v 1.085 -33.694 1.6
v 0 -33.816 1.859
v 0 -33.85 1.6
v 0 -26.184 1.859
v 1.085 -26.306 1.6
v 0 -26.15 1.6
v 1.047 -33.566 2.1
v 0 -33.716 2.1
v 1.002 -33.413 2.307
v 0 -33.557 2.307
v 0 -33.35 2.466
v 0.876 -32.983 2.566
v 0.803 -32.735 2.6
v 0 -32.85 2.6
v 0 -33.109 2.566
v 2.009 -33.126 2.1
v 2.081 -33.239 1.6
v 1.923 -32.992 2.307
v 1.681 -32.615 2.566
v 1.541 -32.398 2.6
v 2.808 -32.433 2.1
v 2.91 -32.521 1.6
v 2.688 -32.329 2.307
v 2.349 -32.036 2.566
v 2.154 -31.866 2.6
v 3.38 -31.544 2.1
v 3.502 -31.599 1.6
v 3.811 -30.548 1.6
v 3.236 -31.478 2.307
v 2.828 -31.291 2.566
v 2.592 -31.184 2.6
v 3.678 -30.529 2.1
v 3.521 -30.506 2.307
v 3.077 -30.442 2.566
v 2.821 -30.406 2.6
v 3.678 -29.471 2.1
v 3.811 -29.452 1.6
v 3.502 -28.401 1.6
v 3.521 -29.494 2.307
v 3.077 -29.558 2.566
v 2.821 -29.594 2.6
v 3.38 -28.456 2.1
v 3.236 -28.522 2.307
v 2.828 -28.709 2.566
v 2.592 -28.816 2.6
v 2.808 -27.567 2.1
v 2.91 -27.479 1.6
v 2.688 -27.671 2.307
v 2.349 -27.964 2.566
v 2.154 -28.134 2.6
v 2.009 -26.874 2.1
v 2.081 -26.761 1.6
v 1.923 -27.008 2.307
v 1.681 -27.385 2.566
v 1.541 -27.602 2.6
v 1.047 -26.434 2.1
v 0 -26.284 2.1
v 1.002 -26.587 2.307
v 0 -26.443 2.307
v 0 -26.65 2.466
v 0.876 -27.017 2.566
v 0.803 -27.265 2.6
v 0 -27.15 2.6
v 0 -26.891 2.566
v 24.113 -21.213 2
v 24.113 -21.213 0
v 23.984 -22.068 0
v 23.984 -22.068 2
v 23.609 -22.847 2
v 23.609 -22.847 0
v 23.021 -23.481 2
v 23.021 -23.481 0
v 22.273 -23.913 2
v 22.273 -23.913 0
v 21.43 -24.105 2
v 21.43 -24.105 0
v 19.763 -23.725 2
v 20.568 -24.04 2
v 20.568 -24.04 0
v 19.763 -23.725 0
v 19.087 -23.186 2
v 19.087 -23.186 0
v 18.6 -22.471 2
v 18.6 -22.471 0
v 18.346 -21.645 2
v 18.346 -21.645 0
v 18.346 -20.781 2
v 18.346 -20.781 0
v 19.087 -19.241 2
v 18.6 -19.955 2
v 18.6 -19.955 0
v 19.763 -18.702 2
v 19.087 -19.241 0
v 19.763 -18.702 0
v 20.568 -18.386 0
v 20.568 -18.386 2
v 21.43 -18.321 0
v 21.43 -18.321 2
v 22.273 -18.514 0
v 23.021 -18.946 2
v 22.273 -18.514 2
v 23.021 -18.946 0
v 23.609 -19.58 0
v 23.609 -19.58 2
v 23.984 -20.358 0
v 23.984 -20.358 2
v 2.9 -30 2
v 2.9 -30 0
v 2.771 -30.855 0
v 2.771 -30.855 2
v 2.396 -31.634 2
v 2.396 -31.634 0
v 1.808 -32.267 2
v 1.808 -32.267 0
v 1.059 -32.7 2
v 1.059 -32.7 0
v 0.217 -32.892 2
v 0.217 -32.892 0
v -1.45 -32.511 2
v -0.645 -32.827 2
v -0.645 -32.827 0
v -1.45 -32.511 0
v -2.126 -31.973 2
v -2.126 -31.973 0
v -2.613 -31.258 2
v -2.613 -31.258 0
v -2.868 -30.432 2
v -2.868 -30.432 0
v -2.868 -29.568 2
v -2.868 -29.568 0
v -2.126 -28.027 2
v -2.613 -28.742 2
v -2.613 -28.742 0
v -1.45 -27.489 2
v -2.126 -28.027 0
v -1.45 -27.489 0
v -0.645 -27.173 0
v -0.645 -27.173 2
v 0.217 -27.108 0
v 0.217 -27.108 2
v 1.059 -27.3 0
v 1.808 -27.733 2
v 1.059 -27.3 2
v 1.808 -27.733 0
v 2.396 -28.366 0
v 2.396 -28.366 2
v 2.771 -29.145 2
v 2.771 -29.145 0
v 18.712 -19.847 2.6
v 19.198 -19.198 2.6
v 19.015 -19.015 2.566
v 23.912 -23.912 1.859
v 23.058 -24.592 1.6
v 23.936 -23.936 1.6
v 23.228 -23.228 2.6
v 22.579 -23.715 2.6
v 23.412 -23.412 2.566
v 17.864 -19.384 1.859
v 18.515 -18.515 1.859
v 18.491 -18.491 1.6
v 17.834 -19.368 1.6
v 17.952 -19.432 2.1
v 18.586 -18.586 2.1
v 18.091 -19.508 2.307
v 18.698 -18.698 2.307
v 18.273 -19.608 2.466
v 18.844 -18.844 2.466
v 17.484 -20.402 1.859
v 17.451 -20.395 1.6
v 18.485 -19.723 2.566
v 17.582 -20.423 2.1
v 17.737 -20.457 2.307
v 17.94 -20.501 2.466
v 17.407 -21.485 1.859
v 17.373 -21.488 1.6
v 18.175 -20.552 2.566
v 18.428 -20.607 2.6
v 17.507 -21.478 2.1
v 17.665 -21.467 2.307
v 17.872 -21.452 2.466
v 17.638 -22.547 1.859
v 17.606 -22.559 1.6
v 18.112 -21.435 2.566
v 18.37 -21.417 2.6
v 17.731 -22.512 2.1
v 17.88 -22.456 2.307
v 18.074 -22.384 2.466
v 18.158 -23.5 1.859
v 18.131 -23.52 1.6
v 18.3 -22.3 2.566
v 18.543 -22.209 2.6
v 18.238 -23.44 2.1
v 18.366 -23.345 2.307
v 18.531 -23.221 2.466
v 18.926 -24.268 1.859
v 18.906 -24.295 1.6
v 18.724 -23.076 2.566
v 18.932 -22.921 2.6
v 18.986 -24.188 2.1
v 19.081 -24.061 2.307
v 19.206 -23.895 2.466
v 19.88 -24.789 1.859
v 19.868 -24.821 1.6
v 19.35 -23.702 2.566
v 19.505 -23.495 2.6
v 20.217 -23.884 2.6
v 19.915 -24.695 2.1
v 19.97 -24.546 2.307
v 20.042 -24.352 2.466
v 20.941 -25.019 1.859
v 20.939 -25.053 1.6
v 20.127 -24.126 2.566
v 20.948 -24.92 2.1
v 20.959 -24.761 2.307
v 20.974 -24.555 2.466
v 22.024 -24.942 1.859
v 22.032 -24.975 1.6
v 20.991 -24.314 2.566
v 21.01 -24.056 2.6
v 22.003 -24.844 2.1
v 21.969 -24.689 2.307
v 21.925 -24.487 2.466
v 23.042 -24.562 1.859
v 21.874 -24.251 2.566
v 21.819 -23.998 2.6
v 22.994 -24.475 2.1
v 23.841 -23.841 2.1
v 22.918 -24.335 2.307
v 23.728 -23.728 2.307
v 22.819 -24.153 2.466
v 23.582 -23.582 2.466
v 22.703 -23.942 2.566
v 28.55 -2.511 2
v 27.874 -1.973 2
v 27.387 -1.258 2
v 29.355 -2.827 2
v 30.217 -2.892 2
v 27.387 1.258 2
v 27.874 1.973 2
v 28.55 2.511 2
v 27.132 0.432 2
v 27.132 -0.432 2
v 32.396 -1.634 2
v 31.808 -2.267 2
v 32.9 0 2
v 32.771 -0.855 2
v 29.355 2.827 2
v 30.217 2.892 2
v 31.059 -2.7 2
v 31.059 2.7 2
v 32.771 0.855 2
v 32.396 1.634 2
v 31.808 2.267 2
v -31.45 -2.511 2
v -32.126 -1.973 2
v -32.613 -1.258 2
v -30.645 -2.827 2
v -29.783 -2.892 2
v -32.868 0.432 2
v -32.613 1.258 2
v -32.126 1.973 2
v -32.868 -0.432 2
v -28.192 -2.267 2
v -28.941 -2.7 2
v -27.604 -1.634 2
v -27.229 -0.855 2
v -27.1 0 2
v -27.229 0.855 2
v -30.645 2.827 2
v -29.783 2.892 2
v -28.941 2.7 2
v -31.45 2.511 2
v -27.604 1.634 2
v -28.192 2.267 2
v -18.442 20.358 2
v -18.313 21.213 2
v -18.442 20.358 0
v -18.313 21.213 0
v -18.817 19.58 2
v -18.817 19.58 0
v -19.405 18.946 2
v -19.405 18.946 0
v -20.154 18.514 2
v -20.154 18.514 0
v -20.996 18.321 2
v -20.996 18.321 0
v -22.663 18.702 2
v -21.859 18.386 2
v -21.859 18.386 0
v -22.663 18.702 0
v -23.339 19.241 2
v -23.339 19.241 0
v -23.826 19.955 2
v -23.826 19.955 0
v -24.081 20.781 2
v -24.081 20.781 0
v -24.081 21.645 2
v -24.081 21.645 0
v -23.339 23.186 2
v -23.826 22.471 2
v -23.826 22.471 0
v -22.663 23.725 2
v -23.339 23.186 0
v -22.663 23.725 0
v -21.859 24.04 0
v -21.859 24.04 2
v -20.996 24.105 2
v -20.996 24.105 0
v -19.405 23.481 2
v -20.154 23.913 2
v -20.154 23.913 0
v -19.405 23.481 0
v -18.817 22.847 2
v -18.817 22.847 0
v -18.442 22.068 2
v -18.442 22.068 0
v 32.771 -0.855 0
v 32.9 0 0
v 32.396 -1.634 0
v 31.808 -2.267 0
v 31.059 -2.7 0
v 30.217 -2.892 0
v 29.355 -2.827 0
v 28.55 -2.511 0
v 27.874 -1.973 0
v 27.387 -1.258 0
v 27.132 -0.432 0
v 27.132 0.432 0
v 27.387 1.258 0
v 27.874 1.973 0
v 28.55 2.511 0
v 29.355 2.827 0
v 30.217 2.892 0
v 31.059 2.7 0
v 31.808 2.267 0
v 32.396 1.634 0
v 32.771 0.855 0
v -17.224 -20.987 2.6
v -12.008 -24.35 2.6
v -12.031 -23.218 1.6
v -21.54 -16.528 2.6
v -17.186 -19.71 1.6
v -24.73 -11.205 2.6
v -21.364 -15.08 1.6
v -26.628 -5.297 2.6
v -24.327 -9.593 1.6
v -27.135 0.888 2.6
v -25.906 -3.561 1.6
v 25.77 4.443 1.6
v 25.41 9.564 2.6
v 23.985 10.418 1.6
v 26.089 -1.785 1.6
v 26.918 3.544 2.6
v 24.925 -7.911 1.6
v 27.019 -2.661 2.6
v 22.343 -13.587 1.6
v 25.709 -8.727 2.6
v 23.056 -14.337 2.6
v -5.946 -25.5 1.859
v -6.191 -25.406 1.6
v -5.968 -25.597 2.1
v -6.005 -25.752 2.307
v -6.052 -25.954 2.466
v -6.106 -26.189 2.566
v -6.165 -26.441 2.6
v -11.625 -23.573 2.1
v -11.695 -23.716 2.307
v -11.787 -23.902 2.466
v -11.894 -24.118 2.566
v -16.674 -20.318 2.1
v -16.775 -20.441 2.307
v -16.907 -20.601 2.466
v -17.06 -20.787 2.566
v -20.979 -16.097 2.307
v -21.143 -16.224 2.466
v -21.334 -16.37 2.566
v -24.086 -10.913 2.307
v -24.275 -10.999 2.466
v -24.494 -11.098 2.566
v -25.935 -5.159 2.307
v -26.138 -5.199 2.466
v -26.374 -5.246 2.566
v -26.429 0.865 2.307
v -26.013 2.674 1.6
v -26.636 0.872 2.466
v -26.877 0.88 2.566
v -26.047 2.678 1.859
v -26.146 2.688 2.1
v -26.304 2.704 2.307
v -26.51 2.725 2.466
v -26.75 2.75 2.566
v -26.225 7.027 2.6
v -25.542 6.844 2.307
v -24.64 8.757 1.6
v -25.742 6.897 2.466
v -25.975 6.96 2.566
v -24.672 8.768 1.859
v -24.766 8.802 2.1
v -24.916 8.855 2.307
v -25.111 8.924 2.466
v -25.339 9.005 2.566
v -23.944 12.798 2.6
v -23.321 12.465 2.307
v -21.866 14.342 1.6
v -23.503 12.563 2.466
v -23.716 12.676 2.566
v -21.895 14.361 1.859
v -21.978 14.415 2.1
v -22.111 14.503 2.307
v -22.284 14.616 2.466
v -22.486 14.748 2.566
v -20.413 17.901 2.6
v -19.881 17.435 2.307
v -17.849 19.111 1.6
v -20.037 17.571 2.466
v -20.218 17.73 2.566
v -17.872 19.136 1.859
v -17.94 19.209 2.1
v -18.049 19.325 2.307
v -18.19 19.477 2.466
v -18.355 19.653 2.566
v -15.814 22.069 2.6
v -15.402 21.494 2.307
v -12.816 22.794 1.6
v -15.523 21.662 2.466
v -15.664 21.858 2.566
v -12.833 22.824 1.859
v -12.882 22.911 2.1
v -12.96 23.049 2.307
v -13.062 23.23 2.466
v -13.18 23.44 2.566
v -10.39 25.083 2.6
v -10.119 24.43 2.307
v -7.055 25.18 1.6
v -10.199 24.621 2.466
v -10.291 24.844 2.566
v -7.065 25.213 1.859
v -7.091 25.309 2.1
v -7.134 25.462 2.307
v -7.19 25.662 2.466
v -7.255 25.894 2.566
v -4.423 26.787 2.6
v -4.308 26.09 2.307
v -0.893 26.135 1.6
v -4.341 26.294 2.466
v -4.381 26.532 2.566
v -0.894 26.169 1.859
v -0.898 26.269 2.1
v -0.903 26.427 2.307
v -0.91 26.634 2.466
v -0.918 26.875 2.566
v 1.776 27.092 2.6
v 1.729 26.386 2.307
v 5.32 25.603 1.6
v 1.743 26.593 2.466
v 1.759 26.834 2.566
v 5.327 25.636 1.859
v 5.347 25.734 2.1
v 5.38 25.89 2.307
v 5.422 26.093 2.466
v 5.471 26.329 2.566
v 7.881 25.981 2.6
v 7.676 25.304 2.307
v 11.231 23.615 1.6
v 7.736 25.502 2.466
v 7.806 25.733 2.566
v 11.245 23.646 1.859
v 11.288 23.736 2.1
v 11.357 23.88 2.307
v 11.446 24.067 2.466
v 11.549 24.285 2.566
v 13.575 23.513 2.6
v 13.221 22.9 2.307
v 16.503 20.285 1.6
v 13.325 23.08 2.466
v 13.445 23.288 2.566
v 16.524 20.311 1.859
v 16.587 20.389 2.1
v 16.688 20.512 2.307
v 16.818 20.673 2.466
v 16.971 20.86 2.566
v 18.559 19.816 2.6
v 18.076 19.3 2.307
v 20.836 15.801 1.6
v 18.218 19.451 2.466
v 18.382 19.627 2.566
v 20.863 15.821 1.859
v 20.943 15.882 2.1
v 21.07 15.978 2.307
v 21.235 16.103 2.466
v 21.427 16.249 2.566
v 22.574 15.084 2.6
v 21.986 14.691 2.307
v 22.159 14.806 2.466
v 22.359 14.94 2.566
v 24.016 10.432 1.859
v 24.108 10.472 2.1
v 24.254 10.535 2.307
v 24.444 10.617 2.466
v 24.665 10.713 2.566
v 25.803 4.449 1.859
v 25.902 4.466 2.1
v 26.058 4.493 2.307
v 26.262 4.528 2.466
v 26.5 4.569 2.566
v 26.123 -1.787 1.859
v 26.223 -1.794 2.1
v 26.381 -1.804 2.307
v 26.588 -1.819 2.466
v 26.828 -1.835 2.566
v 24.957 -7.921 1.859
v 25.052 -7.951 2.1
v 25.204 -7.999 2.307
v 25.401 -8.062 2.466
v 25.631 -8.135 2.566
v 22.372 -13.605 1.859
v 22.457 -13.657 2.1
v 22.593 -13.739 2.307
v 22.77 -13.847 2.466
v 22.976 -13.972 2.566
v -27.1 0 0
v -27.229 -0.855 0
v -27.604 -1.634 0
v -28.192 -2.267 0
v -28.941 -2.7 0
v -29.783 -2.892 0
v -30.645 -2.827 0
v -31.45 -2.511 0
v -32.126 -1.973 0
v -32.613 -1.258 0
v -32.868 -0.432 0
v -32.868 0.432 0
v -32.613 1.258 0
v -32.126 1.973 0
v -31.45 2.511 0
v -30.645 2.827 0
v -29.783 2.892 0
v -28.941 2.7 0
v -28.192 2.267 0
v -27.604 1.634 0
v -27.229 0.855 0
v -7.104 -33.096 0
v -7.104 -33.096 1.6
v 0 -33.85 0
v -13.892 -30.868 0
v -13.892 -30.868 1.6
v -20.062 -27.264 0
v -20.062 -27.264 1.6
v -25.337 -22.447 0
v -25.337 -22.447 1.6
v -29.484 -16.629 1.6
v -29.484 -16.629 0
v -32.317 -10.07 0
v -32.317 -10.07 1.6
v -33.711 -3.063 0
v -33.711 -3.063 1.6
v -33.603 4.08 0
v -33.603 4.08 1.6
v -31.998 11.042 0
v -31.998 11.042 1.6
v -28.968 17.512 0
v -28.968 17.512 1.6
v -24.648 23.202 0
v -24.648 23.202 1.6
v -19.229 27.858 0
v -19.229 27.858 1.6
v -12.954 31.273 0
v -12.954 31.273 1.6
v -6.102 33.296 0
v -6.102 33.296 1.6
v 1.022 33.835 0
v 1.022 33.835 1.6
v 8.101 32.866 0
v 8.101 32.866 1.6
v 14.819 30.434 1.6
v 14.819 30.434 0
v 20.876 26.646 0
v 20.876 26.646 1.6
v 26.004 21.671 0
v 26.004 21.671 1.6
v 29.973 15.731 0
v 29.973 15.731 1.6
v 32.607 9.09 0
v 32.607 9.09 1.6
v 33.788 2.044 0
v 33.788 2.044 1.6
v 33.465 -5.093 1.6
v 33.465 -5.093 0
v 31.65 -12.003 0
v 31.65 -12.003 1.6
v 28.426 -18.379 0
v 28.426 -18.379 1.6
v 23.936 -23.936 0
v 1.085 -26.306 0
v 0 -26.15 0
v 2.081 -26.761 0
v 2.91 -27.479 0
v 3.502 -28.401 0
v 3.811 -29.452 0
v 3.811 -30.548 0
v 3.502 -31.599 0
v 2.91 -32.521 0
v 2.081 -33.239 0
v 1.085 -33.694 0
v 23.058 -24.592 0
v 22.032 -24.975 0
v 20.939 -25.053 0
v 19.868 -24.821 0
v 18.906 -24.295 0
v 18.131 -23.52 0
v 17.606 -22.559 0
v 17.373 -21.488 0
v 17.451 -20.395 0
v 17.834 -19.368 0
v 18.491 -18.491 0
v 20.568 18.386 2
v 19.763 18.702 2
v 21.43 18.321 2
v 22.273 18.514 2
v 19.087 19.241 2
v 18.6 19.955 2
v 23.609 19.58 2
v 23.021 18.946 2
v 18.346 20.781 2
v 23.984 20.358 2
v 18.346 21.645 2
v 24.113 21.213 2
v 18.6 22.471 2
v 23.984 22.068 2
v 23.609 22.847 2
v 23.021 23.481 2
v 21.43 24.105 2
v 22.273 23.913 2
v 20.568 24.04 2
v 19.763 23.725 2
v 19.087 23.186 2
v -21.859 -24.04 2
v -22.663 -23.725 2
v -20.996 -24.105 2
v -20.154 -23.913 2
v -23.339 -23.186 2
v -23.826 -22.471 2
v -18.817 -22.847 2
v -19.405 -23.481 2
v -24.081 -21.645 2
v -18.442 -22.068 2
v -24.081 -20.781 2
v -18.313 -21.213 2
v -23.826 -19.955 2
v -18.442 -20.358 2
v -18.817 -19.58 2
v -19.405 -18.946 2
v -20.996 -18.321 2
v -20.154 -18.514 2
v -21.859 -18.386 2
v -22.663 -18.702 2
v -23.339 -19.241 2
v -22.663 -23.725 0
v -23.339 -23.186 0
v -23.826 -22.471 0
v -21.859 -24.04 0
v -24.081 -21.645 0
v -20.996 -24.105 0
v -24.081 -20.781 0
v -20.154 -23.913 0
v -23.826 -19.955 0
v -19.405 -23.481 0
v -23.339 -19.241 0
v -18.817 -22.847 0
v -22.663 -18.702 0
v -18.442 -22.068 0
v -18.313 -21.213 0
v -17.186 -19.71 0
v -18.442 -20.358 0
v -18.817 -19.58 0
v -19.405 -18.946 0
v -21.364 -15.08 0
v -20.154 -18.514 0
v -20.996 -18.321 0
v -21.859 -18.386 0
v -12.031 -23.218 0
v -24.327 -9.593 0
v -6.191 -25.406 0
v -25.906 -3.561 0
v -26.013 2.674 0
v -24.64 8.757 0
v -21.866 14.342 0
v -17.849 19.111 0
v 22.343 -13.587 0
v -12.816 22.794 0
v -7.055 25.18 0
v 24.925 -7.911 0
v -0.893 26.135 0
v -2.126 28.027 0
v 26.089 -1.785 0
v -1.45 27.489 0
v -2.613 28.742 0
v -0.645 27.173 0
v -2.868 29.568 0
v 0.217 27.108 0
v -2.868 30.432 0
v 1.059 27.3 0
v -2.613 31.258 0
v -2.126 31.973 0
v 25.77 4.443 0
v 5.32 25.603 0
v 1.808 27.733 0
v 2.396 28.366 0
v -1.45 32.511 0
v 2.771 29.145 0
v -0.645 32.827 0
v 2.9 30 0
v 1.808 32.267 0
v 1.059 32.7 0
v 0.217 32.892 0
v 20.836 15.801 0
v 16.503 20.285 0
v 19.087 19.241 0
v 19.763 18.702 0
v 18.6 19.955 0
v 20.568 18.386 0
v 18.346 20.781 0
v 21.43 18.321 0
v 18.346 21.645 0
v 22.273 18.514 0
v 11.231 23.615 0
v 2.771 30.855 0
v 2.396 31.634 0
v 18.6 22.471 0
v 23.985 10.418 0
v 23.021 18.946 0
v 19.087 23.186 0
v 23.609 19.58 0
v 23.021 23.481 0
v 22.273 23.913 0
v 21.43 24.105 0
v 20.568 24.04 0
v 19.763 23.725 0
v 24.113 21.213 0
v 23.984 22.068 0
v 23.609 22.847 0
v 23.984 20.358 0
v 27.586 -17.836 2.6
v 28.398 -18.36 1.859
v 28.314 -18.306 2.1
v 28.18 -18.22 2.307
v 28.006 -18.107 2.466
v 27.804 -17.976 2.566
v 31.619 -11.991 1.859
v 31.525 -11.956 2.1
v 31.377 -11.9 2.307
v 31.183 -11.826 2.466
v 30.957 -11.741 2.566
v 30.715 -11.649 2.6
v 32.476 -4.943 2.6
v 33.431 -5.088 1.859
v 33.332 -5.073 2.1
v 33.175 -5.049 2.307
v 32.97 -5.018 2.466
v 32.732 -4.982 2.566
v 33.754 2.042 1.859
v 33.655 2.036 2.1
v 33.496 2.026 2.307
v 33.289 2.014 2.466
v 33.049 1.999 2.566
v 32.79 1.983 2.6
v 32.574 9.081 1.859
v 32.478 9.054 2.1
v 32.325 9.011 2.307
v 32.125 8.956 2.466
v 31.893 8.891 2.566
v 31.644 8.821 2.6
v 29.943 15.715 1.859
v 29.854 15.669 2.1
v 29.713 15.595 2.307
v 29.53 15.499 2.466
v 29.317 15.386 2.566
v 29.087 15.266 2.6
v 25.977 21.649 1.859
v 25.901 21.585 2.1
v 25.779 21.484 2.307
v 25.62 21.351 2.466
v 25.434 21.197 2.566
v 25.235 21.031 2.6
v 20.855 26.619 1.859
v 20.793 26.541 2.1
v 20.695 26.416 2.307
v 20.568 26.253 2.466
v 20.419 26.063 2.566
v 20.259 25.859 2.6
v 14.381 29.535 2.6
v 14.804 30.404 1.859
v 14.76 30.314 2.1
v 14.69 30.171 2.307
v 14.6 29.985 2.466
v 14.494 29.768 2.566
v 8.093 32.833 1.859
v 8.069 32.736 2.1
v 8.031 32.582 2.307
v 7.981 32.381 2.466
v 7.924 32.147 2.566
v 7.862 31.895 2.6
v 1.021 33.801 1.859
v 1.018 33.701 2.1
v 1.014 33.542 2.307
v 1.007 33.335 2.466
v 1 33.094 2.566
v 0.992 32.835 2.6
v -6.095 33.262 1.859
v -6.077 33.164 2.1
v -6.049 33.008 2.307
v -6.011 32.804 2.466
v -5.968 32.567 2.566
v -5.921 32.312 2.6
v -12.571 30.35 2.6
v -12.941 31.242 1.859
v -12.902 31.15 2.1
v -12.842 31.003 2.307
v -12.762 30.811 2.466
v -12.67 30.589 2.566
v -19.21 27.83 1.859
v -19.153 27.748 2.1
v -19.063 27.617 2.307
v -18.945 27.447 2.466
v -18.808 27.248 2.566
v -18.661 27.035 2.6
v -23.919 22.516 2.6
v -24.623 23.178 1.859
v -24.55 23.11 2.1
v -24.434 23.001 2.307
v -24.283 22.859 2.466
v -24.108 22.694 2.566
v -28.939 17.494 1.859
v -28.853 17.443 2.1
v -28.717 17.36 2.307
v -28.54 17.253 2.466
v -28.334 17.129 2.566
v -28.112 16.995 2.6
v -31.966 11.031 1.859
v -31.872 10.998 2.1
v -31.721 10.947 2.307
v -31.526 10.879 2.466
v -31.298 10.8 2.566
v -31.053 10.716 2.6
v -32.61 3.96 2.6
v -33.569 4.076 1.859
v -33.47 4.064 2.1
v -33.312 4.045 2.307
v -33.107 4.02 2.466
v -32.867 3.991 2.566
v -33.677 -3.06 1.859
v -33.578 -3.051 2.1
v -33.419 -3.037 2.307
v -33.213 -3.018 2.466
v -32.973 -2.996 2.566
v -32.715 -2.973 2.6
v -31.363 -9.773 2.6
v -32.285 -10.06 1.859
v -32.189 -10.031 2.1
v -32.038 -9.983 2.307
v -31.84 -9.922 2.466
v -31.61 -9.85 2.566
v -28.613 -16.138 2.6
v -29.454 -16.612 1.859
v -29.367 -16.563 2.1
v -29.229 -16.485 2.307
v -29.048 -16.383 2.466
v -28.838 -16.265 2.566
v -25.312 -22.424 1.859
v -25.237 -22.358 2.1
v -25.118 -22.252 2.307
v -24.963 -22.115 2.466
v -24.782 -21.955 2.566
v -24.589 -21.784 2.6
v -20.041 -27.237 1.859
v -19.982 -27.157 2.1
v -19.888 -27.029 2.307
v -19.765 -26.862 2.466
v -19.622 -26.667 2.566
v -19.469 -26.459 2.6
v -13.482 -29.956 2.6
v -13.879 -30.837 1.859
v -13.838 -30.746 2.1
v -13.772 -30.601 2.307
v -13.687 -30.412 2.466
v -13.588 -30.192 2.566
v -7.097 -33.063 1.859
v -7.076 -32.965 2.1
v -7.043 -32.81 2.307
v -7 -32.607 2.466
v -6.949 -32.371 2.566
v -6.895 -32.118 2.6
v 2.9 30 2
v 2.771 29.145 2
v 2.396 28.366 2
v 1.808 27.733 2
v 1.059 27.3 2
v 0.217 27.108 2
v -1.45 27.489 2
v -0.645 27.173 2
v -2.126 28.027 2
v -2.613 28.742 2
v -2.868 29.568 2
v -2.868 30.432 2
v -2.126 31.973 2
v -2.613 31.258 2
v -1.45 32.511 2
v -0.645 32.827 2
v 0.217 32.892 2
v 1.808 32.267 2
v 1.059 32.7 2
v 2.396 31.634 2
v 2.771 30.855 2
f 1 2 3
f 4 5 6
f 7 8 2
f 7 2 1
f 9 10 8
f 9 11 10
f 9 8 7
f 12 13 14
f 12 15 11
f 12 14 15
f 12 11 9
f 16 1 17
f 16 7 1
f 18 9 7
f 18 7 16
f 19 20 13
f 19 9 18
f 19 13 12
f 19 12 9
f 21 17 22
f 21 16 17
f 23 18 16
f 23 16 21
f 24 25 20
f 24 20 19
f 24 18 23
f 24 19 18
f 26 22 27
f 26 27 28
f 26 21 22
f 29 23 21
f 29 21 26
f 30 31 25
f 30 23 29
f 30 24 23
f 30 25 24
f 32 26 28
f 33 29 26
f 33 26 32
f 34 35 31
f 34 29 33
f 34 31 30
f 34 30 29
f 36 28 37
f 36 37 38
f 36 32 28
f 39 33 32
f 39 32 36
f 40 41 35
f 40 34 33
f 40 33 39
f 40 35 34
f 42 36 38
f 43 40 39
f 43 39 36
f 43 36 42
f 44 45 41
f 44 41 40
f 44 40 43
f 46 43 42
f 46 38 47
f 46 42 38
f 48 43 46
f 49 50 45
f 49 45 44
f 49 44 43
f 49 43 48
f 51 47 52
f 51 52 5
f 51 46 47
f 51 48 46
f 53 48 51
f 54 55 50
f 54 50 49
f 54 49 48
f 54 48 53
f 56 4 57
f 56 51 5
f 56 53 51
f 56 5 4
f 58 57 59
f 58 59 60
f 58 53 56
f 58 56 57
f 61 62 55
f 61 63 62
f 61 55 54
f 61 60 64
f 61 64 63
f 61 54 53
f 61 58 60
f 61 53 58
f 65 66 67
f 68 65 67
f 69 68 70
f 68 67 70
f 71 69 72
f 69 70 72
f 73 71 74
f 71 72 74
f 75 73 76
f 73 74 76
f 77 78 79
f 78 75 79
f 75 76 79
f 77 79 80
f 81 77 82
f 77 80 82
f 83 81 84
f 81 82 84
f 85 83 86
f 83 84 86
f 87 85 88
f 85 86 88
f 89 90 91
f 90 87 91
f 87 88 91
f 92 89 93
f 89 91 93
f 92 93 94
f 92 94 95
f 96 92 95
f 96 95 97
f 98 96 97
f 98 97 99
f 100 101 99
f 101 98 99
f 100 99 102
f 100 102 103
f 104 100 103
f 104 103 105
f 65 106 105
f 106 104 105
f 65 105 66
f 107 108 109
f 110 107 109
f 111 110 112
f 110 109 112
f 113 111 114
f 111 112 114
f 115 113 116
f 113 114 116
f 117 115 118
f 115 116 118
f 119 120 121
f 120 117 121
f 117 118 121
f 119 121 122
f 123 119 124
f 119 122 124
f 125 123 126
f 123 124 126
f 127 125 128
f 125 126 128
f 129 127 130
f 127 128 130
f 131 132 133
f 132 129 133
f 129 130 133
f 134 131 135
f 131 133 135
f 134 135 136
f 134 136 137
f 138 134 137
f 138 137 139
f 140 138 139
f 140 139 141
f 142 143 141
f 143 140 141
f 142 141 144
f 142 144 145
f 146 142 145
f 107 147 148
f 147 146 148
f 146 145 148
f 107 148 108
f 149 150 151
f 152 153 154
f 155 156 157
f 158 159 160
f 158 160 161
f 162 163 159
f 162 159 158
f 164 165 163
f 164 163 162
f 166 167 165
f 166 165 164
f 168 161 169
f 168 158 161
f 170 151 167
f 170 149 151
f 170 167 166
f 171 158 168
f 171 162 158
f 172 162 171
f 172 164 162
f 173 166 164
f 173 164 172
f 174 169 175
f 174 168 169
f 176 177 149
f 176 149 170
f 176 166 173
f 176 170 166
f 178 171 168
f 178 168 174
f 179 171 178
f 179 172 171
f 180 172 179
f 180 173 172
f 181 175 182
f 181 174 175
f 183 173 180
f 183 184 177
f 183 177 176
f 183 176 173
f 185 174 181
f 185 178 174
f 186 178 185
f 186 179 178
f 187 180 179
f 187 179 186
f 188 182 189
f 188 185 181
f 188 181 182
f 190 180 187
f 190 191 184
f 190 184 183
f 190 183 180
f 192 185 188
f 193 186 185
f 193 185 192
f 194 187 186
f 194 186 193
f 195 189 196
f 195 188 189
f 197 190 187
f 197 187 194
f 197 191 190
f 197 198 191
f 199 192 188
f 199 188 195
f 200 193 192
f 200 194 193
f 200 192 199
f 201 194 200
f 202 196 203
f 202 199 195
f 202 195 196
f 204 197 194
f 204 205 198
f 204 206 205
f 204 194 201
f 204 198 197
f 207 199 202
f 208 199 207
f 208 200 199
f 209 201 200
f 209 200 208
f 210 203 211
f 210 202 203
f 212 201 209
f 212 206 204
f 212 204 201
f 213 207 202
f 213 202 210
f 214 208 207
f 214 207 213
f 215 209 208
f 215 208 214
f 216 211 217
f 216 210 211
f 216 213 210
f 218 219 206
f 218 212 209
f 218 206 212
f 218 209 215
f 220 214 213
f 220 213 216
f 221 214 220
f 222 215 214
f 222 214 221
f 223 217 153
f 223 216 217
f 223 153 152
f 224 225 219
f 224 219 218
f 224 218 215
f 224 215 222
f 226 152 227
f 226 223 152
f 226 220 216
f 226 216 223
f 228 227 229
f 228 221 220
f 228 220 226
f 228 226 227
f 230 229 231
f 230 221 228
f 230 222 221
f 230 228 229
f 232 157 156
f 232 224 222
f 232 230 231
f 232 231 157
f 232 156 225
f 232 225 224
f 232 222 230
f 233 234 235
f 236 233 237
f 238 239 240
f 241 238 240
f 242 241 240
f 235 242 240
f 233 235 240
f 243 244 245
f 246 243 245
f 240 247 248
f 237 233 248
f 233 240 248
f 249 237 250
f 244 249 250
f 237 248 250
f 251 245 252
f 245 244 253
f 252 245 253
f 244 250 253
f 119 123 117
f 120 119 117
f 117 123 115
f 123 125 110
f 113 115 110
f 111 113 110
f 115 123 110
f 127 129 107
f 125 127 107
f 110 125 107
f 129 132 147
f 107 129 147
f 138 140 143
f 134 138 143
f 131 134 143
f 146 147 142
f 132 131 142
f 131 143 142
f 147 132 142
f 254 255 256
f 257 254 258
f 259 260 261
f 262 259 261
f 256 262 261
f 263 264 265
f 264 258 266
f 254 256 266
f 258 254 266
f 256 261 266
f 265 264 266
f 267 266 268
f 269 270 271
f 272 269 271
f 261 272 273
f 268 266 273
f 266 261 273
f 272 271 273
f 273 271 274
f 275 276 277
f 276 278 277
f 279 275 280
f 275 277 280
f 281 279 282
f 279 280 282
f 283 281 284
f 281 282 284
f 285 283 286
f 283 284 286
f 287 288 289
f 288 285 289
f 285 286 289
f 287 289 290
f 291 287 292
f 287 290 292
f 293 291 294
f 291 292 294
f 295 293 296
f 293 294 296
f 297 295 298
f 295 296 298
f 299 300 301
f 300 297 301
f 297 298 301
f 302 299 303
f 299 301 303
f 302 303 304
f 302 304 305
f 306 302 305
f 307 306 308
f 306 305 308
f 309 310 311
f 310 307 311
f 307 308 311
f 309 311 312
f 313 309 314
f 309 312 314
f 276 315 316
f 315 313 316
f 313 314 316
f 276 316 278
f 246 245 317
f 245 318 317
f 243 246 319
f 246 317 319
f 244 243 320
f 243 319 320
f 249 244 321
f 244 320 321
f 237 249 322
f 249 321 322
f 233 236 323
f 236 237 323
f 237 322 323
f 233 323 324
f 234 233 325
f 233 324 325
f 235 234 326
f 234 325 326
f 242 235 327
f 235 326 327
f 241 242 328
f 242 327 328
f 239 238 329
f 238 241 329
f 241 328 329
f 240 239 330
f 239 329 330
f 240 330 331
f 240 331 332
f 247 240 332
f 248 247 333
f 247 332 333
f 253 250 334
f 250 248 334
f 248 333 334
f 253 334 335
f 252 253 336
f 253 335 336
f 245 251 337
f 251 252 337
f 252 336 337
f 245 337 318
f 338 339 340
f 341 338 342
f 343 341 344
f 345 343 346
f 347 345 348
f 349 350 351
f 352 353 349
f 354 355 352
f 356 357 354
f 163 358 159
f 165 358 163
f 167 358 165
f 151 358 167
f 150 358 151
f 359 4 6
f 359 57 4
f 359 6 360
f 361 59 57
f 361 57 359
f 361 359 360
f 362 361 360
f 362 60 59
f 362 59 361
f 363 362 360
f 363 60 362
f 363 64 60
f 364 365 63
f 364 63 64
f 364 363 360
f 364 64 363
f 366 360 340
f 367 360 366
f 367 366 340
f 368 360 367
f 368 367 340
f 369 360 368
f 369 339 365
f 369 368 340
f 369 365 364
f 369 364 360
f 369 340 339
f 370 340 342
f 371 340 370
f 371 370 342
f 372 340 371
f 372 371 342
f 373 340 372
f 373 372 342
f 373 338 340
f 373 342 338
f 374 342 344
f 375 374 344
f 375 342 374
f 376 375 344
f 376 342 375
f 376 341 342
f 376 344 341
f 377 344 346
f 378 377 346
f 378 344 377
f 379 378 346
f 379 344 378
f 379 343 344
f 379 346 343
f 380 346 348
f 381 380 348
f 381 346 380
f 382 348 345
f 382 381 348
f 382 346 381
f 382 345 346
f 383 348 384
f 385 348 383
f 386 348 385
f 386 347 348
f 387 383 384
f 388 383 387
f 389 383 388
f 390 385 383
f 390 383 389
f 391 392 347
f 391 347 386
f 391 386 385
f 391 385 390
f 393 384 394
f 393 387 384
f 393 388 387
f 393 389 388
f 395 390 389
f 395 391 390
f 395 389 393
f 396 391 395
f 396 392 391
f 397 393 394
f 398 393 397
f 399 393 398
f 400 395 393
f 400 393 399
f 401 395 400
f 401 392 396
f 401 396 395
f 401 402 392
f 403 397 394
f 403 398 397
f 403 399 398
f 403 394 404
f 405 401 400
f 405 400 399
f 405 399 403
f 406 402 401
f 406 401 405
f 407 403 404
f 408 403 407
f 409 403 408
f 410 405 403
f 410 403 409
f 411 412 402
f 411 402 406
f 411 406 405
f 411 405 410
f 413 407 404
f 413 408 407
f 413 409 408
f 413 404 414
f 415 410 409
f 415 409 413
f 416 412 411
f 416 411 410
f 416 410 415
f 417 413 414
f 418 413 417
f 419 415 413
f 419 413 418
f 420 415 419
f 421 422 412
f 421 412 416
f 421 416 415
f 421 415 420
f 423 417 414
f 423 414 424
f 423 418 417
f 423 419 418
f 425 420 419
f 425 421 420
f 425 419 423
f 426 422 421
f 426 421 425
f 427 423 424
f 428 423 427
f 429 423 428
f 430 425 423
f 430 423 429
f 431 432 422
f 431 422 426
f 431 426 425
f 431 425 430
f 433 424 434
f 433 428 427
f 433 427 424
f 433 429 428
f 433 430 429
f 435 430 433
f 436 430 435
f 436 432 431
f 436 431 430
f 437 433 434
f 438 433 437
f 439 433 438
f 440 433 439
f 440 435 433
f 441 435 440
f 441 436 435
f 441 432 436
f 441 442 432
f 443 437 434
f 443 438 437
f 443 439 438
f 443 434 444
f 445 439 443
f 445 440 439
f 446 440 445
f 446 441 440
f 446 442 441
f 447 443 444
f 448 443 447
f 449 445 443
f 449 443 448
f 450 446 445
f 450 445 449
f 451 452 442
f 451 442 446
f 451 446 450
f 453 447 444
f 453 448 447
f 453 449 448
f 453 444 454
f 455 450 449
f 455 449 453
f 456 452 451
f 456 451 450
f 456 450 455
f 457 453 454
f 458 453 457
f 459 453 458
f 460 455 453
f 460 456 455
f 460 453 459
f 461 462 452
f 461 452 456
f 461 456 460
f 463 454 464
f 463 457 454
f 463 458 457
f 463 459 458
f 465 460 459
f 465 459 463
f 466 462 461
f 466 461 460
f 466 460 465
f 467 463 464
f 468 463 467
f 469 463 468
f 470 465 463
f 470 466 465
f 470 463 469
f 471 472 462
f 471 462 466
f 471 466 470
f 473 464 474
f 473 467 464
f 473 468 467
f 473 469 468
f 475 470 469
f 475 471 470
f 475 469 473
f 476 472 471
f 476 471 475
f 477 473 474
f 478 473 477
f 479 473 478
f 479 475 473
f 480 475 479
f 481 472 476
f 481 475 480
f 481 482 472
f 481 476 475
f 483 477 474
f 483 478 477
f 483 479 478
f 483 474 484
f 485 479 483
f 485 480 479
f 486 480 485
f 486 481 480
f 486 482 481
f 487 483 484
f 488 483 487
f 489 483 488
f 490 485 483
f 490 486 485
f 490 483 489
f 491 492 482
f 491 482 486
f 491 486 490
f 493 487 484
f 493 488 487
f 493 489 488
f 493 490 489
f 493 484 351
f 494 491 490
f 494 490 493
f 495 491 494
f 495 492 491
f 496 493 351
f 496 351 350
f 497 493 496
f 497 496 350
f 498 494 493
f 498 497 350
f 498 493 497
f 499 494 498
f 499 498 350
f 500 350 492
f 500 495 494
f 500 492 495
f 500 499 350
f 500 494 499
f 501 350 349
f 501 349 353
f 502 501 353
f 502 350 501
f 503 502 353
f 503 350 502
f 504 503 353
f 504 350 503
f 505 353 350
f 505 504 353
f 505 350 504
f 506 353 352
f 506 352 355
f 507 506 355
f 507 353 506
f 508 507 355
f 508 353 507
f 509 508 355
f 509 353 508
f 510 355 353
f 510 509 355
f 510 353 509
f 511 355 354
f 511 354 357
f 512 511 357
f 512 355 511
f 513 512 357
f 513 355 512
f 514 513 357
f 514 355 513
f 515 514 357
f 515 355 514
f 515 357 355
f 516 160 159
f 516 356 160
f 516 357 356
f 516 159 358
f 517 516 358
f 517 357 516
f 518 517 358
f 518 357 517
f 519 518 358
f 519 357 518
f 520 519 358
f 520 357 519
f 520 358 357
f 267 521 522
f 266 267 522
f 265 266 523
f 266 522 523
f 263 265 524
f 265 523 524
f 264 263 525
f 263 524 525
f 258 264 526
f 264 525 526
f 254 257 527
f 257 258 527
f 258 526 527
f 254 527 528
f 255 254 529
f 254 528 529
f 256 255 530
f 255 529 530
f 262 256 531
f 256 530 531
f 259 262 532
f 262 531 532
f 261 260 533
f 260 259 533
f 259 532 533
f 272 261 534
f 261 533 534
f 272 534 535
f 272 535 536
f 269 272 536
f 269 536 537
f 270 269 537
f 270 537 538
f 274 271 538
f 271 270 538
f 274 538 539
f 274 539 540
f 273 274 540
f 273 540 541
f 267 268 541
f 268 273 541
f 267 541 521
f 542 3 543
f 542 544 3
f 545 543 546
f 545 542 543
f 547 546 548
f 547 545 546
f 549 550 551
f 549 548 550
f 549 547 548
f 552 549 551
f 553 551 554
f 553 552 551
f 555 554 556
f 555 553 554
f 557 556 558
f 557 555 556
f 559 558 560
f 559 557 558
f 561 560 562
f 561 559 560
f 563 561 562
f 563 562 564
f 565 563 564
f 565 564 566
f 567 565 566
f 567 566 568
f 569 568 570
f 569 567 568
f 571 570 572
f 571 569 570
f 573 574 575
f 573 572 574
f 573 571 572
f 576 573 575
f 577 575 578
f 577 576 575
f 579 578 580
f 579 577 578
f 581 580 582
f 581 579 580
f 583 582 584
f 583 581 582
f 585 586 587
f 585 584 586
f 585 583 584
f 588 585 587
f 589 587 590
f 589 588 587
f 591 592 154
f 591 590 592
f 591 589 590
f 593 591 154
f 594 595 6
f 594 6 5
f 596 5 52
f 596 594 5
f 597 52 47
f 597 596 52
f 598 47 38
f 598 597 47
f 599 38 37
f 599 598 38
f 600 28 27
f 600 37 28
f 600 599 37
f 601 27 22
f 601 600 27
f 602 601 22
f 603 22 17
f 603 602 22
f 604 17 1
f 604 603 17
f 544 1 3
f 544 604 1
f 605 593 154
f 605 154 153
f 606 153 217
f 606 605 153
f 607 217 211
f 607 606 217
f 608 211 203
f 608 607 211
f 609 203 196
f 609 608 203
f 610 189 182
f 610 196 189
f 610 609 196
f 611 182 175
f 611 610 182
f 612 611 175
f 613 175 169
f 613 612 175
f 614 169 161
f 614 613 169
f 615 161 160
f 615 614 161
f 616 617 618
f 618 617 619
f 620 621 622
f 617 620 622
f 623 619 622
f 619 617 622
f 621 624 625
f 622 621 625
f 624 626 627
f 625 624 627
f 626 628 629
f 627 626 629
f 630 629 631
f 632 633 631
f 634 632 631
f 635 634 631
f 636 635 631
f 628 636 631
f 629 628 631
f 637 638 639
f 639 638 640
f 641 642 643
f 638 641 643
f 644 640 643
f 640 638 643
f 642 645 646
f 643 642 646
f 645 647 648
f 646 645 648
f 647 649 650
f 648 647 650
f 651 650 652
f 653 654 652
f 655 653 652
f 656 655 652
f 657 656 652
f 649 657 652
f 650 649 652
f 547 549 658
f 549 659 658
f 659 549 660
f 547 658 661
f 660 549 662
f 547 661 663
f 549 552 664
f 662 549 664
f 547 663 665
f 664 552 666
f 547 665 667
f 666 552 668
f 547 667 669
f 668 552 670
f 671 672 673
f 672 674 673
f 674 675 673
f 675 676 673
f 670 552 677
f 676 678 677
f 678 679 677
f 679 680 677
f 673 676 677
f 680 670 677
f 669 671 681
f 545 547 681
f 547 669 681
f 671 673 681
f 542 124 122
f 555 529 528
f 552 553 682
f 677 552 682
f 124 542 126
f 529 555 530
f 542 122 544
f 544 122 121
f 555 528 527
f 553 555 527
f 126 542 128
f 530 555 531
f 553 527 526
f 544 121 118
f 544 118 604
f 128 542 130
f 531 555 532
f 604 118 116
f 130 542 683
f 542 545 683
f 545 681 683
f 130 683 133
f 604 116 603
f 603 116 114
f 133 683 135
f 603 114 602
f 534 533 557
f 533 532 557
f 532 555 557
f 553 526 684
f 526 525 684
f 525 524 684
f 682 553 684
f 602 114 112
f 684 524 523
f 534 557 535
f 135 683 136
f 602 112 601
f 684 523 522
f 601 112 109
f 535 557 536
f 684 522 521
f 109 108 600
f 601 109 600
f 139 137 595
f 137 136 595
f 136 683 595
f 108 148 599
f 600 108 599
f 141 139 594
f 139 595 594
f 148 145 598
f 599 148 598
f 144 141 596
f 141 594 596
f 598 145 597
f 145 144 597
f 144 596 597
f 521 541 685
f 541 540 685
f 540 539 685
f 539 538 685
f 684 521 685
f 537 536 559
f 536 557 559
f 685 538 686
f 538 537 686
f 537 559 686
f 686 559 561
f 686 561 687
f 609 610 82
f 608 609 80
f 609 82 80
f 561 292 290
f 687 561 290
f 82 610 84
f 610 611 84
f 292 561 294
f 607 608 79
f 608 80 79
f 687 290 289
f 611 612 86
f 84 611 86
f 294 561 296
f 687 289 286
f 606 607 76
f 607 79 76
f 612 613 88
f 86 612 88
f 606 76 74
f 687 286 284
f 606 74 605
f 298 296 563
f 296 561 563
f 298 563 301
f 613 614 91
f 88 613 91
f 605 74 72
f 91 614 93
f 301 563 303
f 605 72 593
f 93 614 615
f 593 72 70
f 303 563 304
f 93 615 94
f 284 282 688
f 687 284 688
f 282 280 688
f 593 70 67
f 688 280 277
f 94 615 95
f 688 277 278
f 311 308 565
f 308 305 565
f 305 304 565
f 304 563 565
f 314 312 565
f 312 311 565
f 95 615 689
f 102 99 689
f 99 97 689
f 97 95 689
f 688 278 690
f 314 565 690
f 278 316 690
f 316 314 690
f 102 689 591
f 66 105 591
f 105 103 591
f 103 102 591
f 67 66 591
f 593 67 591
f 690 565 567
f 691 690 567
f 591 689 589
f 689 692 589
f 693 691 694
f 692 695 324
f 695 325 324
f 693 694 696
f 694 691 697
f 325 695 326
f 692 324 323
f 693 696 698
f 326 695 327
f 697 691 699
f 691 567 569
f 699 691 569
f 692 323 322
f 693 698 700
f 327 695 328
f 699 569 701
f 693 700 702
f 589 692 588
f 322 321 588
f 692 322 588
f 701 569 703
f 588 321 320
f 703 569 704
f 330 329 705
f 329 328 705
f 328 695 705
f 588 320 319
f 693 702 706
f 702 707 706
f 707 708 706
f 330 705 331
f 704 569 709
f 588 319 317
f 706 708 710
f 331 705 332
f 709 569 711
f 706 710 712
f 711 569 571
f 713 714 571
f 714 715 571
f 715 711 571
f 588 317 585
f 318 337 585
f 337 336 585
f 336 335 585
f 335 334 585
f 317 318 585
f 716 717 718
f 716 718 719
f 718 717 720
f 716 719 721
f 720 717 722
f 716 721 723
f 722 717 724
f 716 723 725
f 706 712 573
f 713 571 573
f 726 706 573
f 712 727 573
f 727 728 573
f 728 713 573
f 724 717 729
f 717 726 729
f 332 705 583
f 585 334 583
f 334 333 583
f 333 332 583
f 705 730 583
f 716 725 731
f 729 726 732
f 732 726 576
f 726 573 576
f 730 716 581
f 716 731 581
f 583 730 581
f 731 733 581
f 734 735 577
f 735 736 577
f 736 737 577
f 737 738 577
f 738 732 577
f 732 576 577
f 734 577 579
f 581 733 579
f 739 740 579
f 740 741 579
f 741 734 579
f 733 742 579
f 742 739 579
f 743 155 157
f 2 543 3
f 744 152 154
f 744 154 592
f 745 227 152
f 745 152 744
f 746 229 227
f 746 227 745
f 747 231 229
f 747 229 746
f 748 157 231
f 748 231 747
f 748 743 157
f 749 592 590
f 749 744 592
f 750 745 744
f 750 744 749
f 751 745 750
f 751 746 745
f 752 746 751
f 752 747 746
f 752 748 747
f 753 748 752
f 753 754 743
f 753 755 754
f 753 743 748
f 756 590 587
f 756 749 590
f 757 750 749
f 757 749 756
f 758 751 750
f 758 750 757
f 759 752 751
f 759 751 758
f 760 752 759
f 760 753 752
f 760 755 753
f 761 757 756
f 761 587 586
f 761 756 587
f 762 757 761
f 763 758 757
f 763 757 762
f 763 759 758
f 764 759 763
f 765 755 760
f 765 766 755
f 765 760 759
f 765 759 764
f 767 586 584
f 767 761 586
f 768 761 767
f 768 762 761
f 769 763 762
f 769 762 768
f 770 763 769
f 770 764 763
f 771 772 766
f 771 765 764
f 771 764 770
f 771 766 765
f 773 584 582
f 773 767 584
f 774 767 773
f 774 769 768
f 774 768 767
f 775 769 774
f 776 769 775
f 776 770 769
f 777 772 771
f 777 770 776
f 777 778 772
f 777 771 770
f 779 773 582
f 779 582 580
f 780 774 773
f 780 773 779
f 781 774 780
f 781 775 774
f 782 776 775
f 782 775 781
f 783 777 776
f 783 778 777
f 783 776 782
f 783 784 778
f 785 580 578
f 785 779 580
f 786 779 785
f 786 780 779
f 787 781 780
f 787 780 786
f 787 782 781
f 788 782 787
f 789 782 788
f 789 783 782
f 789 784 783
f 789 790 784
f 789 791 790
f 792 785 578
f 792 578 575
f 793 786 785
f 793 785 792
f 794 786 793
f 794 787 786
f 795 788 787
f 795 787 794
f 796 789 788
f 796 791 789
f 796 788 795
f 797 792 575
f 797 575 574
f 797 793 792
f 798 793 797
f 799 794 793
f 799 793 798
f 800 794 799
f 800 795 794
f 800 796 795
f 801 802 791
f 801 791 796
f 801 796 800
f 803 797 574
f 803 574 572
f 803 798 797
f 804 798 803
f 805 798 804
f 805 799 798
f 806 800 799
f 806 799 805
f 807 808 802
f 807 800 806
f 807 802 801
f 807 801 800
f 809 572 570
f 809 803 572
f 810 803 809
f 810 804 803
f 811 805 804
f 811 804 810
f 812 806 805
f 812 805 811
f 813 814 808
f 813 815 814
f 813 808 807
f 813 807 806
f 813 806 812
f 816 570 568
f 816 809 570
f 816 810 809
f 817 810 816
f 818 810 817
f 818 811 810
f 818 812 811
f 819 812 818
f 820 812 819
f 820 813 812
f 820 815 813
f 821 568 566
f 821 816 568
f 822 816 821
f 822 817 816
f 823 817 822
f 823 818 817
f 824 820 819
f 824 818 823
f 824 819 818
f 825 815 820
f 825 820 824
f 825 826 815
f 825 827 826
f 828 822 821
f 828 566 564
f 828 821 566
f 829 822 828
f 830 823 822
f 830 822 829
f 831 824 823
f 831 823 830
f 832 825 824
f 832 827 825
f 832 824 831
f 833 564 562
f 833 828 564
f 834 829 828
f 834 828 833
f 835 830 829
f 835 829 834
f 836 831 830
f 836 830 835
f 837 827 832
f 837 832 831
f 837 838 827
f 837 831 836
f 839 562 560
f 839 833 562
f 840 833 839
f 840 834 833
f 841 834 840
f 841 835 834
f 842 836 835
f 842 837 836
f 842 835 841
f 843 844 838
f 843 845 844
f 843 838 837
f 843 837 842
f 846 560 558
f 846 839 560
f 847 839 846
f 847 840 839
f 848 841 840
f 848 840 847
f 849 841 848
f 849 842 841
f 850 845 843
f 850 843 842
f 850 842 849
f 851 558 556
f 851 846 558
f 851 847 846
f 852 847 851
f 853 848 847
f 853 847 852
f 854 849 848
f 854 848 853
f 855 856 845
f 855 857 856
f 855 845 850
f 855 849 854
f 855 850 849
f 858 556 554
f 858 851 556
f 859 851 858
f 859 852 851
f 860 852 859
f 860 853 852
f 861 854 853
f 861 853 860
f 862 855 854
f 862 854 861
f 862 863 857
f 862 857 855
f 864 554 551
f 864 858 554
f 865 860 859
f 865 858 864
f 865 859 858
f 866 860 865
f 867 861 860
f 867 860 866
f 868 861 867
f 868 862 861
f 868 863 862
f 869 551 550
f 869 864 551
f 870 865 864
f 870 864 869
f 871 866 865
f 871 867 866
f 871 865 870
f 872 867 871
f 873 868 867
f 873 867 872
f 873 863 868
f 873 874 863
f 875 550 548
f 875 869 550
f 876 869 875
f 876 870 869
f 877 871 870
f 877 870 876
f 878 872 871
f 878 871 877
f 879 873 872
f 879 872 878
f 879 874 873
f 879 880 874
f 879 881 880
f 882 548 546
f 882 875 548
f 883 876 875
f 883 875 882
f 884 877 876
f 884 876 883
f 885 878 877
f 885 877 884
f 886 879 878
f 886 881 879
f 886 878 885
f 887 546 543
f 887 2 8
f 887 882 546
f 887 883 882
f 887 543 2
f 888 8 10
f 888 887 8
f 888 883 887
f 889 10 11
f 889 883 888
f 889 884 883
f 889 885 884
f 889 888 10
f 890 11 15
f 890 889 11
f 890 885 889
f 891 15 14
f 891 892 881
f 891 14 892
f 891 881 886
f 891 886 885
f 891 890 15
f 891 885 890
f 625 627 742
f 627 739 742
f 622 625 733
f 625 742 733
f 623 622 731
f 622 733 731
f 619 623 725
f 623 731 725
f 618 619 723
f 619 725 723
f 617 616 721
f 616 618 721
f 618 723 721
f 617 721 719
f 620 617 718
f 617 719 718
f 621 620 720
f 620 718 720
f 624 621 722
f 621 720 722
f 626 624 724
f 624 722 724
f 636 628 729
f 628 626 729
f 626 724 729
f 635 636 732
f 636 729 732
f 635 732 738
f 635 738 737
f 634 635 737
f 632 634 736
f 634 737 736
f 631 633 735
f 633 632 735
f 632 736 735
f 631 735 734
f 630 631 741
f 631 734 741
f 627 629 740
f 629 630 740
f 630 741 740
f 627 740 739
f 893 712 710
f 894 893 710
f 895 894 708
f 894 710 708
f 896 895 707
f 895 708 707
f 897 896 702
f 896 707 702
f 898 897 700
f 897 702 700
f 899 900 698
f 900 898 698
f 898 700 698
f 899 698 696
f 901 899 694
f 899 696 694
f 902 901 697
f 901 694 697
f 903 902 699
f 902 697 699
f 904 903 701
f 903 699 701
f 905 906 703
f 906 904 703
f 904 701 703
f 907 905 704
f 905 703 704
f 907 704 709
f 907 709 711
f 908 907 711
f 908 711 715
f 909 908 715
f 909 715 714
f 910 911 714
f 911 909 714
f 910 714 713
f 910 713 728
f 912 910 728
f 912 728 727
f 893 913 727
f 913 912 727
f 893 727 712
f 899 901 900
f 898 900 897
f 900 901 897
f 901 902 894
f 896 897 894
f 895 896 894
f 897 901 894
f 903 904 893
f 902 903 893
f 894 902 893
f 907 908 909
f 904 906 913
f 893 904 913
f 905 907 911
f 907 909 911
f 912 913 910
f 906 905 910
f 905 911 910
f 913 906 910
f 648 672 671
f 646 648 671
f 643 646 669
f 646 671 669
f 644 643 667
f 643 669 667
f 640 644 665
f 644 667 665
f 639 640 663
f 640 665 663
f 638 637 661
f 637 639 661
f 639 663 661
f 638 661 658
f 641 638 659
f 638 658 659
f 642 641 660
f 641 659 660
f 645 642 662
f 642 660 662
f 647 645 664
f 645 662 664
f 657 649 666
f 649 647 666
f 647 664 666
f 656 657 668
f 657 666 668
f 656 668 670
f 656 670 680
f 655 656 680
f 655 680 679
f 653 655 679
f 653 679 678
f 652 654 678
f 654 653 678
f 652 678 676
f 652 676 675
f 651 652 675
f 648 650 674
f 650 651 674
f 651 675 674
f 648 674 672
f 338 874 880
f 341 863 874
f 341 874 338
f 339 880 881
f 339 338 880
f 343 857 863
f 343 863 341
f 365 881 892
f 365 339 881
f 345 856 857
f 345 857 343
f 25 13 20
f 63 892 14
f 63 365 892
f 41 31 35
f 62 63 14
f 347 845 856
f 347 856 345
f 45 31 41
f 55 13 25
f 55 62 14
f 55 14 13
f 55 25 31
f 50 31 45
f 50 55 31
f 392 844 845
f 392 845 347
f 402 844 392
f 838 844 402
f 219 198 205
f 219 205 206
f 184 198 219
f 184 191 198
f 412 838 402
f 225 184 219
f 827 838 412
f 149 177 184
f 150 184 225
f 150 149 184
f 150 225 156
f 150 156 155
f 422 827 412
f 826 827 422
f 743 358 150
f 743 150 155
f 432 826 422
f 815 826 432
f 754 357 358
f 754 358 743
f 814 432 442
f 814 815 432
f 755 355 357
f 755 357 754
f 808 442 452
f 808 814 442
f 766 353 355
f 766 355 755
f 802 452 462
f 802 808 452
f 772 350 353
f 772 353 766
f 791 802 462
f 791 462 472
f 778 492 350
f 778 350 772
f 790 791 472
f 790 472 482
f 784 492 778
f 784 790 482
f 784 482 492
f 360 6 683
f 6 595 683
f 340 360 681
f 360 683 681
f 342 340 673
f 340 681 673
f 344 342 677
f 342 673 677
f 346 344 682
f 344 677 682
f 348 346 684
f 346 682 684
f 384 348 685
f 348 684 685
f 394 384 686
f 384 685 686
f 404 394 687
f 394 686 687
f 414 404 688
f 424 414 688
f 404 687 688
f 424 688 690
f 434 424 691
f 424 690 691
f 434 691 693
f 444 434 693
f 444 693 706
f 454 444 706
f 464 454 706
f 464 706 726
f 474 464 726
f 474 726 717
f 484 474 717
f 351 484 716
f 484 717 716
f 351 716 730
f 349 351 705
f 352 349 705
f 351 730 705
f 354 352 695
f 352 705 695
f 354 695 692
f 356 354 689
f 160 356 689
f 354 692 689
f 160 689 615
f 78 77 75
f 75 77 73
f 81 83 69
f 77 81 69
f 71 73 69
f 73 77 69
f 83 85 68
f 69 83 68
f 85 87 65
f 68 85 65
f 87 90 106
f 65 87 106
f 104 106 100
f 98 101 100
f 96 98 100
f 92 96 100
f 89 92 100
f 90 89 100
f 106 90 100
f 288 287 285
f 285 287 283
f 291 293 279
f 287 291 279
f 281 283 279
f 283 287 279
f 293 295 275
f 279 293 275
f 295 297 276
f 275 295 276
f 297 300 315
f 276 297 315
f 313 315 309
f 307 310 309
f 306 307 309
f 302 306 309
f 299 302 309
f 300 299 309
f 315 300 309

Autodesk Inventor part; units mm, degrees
ref_plane "YZ Plane" through (0, 0, 0) normal (1, 0, 0) x (0, 1, 0)
ref_plane "XZ Plane" through (0, 0, 0) normal (0, 1, 0) x (-1, 0, 0)
ref_plane "XY Plane" through (0, 0, 0) normal (0, 0, 1) x (1, 0, 0)
sketch "Block1" plane through (0, 0, 0) normal (0, 0, 1) x (1, 0, 0)
  circle A0 centre (250, 0) radius 40 construction
  arc A1 (284, 0) -> (274.0416, -24.0416) centre (250, 0) ccw construction
  circle A2 centre (250, 0) radius 10.05 construction
  arc A3 (276, 0) -> (268.3848, -18.3848) centre (250, 0) ccw construction
  circle A4 centre (280, 0) radius 1.6 construction
  arc A5 (276, 0) -> (284, 0) centre (280, 0) ccw construction
  circle A6 centre (271.2132, -21.2132) radius 1.6 construction
  arc A7 (274.0416, -24.0416) -> (268.3848, -18.3848) centre (271.2132, -21.2132) ccw construction
  point P0 (269.205, -7.955)
  dimension "d0" = 8
sketch "Sketch1" plane through (0, 0, 0) normal (0, 0, 1) x (1, 0, 0)
  arc A0 (18.4908, -18.4908) -> (0, -26.15) centre (0, 0) ccw
  arc A1 (23.9356, -23.9356) -> (0, -33.85) centre (0, 0) ccw
  arc A2 (0, -33.85) -> (0, -26.15) centre (0, -30) ccw
  circle A3 centre (0, -30) radius 2.9
  arc A4 (18.4908, -18.4908) -> (23.9356, -23.9356) centre (21.2132, -21.2132) ccw
  circle A5 centre (21.2132, -21.2132) radius 2.9
  circle A6 centre (30, 0) radius 2.9
  circle A7 centre (21.2132, 21.2132) radius 2.9
  circle A8 centre (0, 30) radius 2.9
  circle A9 centre (-21.2132, 21.2132) radius 2.9
  circle A10 centre (-30, 0) radius 2.9
  circle A11 centre (-21.2132, -21.2132) radius 2.9
  point P0 (0, 0)
  point P1 (0, 0)
  dimension "d1" = 0.15
  dimension "d2" = 5.8
  dimension "d5" = 360
extrude "Extrusion1" add sketch "Sketch1" along normal blind 2
sketch "Sketch2" plane through (0, 0, 2) normal (0, 0, 1) x (1, 0, 0)
  arc A0 (23.9356, -23.9356) -> (0, -33.85) centre (0, 0) ccw projected
  arc A1 (0, -33.85) -> (0, -26.15) centre (0, -30) ccw projected
  arc A2 (18.4908, -18.4908) -> (0, -26.15) centre (0, 0) ccw projected
  arc A3 (18.4908, -18.4908) -> (23.9356, -23.9356) centre (21.2132, -21.2132) ccw projected
  circle A4 centre (0, 30) radius 2.9 projected
  circle A5 centre (30, 0) radius 2.9 projected
  circle A6 centre (21.2132, -21.2132) radius 2.9 projected
  circle A7 centre (-30, 0) radius 2.9 projected
  circle A8 centre (-21.2132, -21.2132) radius 2.9 projected
  circle A9 centre (-21.2132, 21.2132) radius 2.9 projected
  circle A10 centre (21.2132, 21.2132) radius 2.9 projected
  circle A11 centre (0, -30) radius 2.9 projected
  point P0 (0, 0)
extrude "Extrusion2" add sketch "Sketch2" along normal blind 0.6 contours A3 A2 A1 A0 | A4 | A5 | A6 | A7 | A8 | A9 | A10 | A11
fillet "Fillet1" radius 1 4 edges at (3.85, -30, 2.6) (-10.0072, 24.1594, 2.6) (18.4908, -23.9356, 2.6) (-12.9538, 31.2733, 2.6)
properties part number "LogoCover"
